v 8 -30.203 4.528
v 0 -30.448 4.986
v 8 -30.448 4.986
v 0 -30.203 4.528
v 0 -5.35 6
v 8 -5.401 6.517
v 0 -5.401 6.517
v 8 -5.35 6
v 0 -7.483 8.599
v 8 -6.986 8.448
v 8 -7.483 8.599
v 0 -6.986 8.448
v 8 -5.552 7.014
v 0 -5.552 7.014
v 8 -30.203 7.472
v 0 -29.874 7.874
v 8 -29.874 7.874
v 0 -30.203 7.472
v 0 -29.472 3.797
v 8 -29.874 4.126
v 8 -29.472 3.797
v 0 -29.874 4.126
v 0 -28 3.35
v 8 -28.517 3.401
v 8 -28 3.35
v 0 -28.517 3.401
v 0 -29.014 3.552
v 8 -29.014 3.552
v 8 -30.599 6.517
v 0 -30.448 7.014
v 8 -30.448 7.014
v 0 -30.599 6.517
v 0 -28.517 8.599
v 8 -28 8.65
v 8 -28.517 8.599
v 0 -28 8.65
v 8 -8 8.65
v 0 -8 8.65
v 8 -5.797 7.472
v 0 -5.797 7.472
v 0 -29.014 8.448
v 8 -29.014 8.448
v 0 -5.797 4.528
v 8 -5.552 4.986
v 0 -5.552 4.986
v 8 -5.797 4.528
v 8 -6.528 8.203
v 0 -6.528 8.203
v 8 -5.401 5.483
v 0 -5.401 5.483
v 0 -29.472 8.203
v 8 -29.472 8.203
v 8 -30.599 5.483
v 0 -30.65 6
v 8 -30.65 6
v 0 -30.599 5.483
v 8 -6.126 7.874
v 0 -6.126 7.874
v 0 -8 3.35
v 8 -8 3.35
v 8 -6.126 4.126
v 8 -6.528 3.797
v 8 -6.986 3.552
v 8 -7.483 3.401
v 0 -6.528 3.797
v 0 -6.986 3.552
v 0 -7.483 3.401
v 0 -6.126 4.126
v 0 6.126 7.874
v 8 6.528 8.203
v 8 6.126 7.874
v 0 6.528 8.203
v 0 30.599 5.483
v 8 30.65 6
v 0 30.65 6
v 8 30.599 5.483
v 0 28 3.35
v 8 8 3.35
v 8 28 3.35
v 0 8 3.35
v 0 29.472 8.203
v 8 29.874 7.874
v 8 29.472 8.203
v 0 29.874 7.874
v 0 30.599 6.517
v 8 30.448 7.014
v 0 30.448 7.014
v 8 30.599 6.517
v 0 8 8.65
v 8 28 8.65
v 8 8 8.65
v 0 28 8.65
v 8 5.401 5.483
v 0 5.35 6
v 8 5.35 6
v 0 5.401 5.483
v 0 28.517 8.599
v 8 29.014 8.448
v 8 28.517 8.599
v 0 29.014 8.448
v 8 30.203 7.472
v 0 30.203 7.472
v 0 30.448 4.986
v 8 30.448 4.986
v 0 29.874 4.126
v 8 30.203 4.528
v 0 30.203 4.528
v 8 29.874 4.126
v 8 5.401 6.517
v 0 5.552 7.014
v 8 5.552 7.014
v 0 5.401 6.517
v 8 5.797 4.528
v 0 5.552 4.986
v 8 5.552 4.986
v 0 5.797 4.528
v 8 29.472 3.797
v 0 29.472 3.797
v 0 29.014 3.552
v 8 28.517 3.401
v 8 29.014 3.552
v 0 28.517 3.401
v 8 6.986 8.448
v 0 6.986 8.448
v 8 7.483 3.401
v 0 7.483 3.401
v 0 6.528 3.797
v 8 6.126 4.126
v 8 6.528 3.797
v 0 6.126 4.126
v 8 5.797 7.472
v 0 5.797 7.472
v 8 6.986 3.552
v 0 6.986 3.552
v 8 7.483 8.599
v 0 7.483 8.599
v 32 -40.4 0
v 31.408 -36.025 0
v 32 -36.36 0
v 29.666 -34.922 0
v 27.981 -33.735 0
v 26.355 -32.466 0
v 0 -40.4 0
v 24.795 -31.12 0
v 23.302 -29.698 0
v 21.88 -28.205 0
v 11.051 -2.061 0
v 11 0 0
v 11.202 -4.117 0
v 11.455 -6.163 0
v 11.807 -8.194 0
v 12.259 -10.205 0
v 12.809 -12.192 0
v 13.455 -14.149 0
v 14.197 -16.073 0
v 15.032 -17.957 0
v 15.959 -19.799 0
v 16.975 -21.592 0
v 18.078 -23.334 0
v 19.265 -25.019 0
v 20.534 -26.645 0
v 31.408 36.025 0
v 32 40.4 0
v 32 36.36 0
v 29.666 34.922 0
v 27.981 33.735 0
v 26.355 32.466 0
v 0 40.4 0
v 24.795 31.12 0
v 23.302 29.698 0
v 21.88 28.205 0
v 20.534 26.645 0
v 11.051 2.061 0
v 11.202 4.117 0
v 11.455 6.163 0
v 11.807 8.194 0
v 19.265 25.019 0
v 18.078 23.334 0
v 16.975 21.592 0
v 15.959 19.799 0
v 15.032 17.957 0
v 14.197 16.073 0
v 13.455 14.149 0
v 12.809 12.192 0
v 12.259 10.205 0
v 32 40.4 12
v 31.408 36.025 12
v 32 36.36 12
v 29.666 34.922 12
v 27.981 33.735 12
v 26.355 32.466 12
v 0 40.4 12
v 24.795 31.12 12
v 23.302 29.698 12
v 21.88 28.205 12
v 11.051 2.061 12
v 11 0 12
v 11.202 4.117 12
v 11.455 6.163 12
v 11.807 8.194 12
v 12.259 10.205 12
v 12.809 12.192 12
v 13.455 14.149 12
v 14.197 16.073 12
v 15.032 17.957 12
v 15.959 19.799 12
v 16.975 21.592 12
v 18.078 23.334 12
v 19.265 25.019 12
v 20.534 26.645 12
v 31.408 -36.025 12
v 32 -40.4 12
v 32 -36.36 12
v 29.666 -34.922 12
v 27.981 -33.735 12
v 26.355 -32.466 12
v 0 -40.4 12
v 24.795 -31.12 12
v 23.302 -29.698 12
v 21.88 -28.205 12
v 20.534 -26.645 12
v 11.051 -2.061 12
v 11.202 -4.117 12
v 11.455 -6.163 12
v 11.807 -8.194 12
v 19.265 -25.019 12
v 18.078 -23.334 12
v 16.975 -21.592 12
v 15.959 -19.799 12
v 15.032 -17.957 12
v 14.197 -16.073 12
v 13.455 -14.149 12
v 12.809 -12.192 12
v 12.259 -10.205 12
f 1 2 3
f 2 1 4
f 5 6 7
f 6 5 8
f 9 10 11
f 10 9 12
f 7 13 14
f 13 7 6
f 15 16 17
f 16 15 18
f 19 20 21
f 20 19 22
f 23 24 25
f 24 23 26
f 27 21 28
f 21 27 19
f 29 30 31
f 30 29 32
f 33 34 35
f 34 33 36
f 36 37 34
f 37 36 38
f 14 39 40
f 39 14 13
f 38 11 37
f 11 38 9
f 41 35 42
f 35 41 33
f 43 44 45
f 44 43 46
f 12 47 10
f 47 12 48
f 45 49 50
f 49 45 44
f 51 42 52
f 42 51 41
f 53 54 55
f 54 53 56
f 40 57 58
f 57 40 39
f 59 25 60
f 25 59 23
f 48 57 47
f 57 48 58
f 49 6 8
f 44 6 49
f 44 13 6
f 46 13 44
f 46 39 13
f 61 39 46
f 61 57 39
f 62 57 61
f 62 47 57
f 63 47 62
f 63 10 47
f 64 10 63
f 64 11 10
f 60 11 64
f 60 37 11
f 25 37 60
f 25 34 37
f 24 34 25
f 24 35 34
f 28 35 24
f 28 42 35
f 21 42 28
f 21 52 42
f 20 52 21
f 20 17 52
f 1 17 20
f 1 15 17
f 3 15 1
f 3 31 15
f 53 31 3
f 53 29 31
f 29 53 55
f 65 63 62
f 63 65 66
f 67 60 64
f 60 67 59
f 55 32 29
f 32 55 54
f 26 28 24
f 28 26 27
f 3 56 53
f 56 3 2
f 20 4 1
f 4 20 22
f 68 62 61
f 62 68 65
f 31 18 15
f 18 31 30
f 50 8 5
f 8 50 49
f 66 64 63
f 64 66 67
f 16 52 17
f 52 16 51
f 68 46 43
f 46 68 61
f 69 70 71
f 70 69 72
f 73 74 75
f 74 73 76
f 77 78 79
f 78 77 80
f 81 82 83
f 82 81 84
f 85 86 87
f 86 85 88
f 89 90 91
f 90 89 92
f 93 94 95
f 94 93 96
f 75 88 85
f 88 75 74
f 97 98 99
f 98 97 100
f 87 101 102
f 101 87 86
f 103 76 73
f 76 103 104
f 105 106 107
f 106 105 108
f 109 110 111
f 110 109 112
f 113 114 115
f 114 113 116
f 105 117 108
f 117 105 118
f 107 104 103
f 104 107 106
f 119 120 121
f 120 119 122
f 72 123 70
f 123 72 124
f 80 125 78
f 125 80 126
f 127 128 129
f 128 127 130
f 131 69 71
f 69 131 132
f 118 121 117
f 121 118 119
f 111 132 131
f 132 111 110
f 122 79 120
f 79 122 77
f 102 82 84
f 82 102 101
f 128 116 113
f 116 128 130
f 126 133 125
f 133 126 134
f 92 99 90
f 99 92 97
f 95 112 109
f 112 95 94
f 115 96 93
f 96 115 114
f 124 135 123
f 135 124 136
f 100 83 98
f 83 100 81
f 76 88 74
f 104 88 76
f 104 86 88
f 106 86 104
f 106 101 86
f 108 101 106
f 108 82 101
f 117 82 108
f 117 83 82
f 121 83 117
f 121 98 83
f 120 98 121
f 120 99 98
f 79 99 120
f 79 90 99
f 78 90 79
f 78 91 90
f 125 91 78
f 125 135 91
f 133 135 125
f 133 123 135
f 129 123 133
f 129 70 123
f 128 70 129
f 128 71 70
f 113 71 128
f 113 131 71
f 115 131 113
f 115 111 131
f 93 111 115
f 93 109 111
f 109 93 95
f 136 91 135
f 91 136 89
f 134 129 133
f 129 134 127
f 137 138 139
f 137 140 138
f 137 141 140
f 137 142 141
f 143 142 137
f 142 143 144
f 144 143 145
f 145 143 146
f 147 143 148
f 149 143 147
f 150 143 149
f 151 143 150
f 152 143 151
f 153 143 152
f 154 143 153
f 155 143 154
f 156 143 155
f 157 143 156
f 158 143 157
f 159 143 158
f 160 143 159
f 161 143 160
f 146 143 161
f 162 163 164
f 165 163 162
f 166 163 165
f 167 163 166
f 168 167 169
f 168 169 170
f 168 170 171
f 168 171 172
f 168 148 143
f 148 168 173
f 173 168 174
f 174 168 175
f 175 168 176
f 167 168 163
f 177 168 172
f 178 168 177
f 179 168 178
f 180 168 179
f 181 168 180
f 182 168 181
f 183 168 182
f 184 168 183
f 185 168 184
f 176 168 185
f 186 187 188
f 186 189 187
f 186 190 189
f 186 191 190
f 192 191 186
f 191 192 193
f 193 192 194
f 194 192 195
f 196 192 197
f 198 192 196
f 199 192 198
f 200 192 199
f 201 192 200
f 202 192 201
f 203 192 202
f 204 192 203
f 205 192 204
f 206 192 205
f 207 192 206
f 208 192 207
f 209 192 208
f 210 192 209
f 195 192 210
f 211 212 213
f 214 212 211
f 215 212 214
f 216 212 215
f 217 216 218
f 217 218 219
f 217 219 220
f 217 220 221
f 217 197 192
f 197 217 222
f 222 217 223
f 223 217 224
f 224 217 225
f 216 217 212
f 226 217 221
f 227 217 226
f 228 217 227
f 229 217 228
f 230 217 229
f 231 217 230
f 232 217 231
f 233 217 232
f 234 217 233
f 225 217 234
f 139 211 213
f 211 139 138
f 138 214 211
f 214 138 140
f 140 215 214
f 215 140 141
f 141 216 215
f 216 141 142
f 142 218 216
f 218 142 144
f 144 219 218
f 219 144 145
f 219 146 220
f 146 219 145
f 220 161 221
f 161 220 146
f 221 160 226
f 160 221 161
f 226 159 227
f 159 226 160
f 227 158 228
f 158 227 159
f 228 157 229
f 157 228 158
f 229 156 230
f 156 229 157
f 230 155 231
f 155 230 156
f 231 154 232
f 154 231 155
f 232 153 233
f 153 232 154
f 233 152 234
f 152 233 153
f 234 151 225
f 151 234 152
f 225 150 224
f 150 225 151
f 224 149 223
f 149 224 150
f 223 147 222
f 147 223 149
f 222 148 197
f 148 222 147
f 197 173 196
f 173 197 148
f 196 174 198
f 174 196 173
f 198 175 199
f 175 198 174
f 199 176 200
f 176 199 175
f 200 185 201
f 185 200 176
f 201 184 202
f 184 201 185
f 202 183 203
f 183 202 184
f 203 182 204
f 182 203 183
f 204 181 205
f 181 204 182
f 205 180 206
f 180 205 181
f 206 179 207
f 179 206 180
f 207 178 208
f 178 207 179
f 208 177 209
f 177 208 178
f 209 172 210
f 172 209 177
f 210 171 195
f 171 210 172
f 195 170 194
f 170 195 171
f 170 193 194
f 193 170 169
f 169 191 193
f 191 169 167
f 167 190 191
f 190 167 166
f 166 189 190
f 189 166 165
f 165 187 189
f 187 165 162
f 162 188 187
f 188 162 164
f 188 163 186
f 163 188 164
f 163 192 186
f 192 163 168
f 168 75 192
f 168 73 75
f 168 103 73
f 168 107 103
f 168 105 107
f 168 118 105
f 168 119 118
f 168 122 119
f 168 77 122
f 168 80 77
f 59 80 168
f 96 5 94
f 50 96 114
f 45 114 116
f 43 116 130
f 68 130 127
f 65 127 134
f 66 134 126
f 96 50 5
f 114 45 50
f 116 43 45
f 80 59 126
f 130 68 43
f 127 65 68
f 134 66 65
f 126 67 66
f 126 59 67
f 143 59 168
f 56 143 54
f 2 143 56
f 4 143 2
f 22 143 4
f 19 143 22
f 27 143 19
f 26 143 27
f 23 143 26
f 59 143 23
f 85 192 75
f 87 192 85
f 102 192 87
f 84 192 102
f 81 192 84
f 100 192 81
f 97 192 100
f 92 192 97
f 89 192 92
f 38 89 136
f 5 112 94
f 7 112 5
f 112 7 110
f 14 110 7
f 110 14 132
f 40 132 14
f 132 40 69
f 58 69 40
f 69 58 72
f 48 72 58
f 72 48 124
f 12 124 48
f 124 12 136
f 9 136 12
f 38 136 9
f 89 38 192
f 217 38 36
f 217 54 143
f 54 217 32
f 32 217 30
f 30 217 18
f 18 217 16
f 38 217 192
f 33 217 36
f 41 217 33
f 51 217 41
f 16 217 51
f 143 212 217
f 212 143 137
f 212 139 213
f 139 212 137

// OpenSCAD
// ==========================================================================
//  GENERATED FILE -- DO NOT EDIT.
//  Produced by build/build.py from components/Turtle_Pressor.scad
//  Turtle Body version 6.7.3
//  Edit lib/ and src/ instead, then run: python3 build/build.py
// ==========================================================================
/*
 Hope Turtle pressor -- Ecojoiner bottle clamp block. Units: mm. License: CERN-OHL-S-2.0.
 EXPERIMENTAL -- not built, fitted or tested. Not yet used by the Ecojoiner
 or full-turtle assemblies (they still show acorn nuts).
 A 12 mm board block in the port gap between a Little John and the bottle,
 its inner edge cut concave to the bottle radius. The John's two M5 cap
 screws drive into two 5.3 mm pill slots (+-10 mm along the edge, v6.6.4) in its back edge and push it onto the
 bottle as they are turned in (screws not modelled). Two are used per port; this file always
 outputs ONE (default part="pressor", already in the print pose). Print part="pressor"
 flat on its board face; the edge holes are horizontal bores. Two per port, one each side of the bottle (24 for six ports).

 SOURCE FILE — geometry lives in lib/pressor.scad + lib/params.scad.
 The committed self-contained file is generated by build/build.py.
*/

/* [Display] */
part = "pressor"; // [pressor,assembly,profile]  -- every part is ONE piece
show_references = true;     // translucent bottle + Little John stand-ins (F5 only)
enable_color_coding = true; // false = neutral shades of brown

/* [Render] */
fn = 128;

// [bundle] begin use <../../lib/pressor.scad>
// ==========================================================================
//  Turtle Body -- pressor: bottle clamp block for an Ecojoiner port
//  (lib module, EXPERIMENTAL, v6.6.1)
// --------------------------------------------------------------------------
//  A flat block cut from the 12 mm board stock that sits in the port gap
//  between a Little John's port face and the bottle. Its inner edge is cut
//  concave to the bottle radius so it wraps the bottle flush. The John's two
//  M5 cap screws pass through the John into Ø5.3 holes (p_pressor_hole_d()) in the
//  pressor's straight back edge. Because the screw bites both pieces, turning
//  it in carries the pressor toward the bottle: the screws push it, with no
//  acorn nut. Two pressors per port, one each side, hug the bottle between
//  them. Not built, fitted or tested.
//
//  Local frame (one pressor, as installed on the -X side of the bottle):
//    X = across the port, from the John toward the bottle. X = 0 is the
//        pressor's straight back edge (faces the John).
//    Y = across the port, along the John height, centred on the bottle axis.
//        The block spans the full port height between the Long Johns.
//    Z = along the bottle axis = the board thickness, Z = 0..t.
//  The concave arc is centred at X = back-to-bottle-axis, Y = 0, radius =
//  bottle radius. The block's inner (straight) edge stands
//  p_pressor_wrap() past the bottle's tangent line, so the arc runs out at
//  Y = +-sqrt(r^2 - (r - wrap)^2) and the corners beyond stay square.
//
//  Pressed (installed) state: the arc meets the bottle; the back edge sits
//  p_pressor_travel() off the John face. Relaxed, the back is on the John and
//  the arc stands that far off the bottle.
//
//  Definitions only. Geometry is emitted by pressor(), pressor_2d() or
//  pressor_port_assembly().
// ==========================================================================

// [bundle] begin use <params.scad>
// ==========================================================================
//  Turtle Body -- shared dimension contract
// --------------------------------------------------------------------------
//  The single source of truth for every dimension that more than one
//  subsystem depends on. Values are exposed as zero-argument functions so
//  this file can be pulled in with `use <params.scad>` (which ignores
//  top-level variable assignments) without polluting any namespace.
//
//  lib/ modules take these as DEFAULT argument values:
//      module control_cap(roof_t = p_cap_roof_t(), ...) { ... }
//  so a src/ wrapper can still override one value from its customizer block
//  while every other subsystem keeps the shared number.
//
//  Rules:
//   * one function per concept, canonical name (see CLAUDE.md cross-file table)
//   * derived values are functions of other p_*() functions, never re-typed
//   * mm throughout; names say _d (diameter), _r (radius), _t (thickness),
//     _len / _h (axial), _af (hex across-flats)
//   * do NOT add a bare `x = ...;` here -- bundle.py / lint.py will reject it
// ==========================================================================

// ---- tolerances and render quality --------------------------------------
function p_eps()          = 0.02;   // Boolean overlap / cut-through fudge
function p_fit_clearance() = 0.2;   // wood joint: TOTAL extra slot width, centred on the board
function p_fn_plastic()   = 120;    // printed PLA parts (cap, cage, axle, mold)
function p_fn_wood()      = 96;     // cut wooden parts
function p_fn_curve()     = 180;    // fine profile curves (bottle, sails)

// ---- bottle (the foundation reference) ---------------------------------
function p_bottle_d()        = 84;    // outside diameter (was 86, and 82 before that; other bottle dims held)
function p_bottle_h()        = 305;   // total height incl. ordinary screw cap
function p_bottle_wall_t()   = 0.5;   // modelling assumption, not a measurement
function p_bottle_cap_d()    = 31;    // ordinary screw cap (NOT the control-cap disk)
function p_bottle_cap_h()    = 17;    // ordinary screw cap height (rear-fin / ballast formulas)
function p_collar_d()        = 34;    // bottle collar, independent of cap diameter
function p_top_dome_h()      = 62;
function p_bottom_dome_h()   = 25;
function p_dome_power()      = 2.5;   // superellipse exponent
function p_bottle_neck_h()   = 5;
function p_bottle_collar_h() = 1;
function p_bottle_neck_d()   = p_bottle_cap_d() - 3;   // 28: neck is 3 mm under the cap
function p_bottle_base_ratio() = 0.88; // slightly narrower footprint at the base
function p_bottle_profile_steps() = 16;
// cut bottle (control head): the lower dome is removed and a short socket is
// bored so the control-cap insert slides in. Cut plane sits 5 mm above the
// bottom dome height.
function p_bottle_cut_extra()  = 5;
function p_bottle_cut_height() = p_bottom_dome_h() + p_bottle_cut_extra();   // 30

// nominal bottle interior and the cap insert that enters it
function p_bottle_socket_d() = p_bottle_d() - 2 * p_bottle_wall_t();          // 81
function p_insert_shaft_radial_clearance() = 1;
function p_insert_shaft_d()  = p_bottle_socket_d()
                             - 2 * p_insert_shaft_radial_clearance();          // 79

// ---- wooden stock -----------------------------------------------------
function p_wood_t()          = 12;    // shared board / slat thickness
function p_fin_board_w()     = 93;    // shared fin-system stock width
function p_screw_side_offset() = 17;  // mounting-hole inset from a John end (was 25 until v4.2.0)

// ---- Ecojoiner port --------------------------------------------------
// A port must swallow the bottle's tapered top (the top dome) plus a seating
// allowance, so its axial length is DERIVED from the bottle, not fixed. This
// is the same rule the HopeTurtles.org generators use
// (port_length = taper_height + port_allowance); until 2026-09-08 lib carried
// the evaluated constant 82 instead, which silently broke the rule for any
// bottle other than the reference one. Ballast and Ecojoiner both read it.
function p_port_allowance()  = 20;                 // seating allowance beyond the dome
function p_port_length()     = p_top_dome_h() + p_port_allowance();   // 62 + 20 = 82
function p_port_height()     = p_bottle_d();       // opening height == bottle diameter (asserted)

// ---- M6 hardware ---------------------------------------------------
function p_m6_clearance_d()  = 6.4;   // M6 clearance hole
function p_m6_bolt_shaft_d() = 6;     // visual placeholder only
function p_m6_bolt_head_d()  = 12;
function p_m6_bolt_head_t()  = 4;

// ---- Ecojoiner bottle clamp: M5 cap screws + acorn nuts (v5.0.0/v5.1.0) --
// Replaces the M6 bolt + 12 mm presser disk. Each John port end carries TWO
// black M5 x 30 socket-head cap screws, stacked across the John height (one
// above, one below the centreline). v5.1.0: no nut -- each screw BITES into
// a 5.2 mm hole in the wood (builder's research; not verified here), so the
// screw itself holds its position and is adjusted with a hex key from
// outside. A black acorn (cap) nut, run fully onto the tip, bears on the
// bottle. Hardware sizes are ISO 4762 / DIN 1587 nominals for visual and
// stack checks only -- measure the hardware you buy.
// Bite-fit hole (was 5.5 clearance in v5.0.0). NOTE it is slightly LARGER
// than the 5 mm nominal major diameter: the hold relies on wood fibre
// springback around the thread, per the builder's own tests -- unverified
// here, and likely to vary with species, moisture and drill quality.
function p_m5_hole_d()           = 5.2;
function p_m5_bolt_d()           = 5;     // visual shank (plain cylinder)
function p_m5_bolt_len()         = 30;    // shank length under the head
function p_m5_head_d()           = 8.5;   // ISO 4762 socket head
function p_m5_head_h()           = 5;
function p_m5_acorn_af()         = 8;
function p_m5_acorn_h()          = 10;    // overall, hex base to dome tip
function p_m5_acorn_thread_depth() = 7;   // usable thread before the bolt bottoms
// Pair layout, shared by the John holes and every board bolted through them
// (rear-fin shafts, ballast core slats): each bolt sits this far in from a
// John long edge, i.e. +-p_eco_screw_pair_offset() from the John centreline.
function p_eco_screw_edge_inset()  = 12;   // was 10 until v5.2.0
function p_eco_screw_pair_offset() =
    (p_port_height() - 2 * p_wood_t()) / 2 - p_eco_screw_edge_inset();   // 18

// ---- pressor (EXPERIMENTAL, v6.6.1; lib/pressor.scad, CLAUDE.md s13a) ----
//  A 12 mm board block in the port gap between a Little John and the bottle,
//  concave-cut to the bottle radius. It rides on the John's M5 pair (both
//  ends bite) and is pushed onto the bottle as the screws are turned in --
//  replaces the acorn nut. Two per port, one each side of the bottle.
function p_pressor_wrap()       = p_bottle_d() / 4;  // 21: inner edge reaches this far past the
                                                      // bottle's tangent line, toward its axis
function p_pressor_travel()     = 1;     // screw-in travel: gap left at the John face when pressed
function p_pressor_hole_d()     = 5.3;   // M5 hole in the pressor's back edge (v6.6.2; the Johns keep p_m5_hole_d() 5.2)
function p_pressor_hole_depth() = 8;     // M5 slot depth into the pressor's back edge (v6.6.4: was 10;
                                          // the slot's inner end sits where the bottle curve is closest)
function p_pressor_min_wall()   = 3;     // least wood around / beyond a screw hole (asserted)
function p_pressor_end_trim()   = 1.5;   // v6.6.4: taken off EACH end (top/bottom edge) -- the printed
                                          // prototype was 3 mm too long to enter the port
function p_pressor_slot_ext()   = 10;    // v6.6.4: each M5 hole stretched this far EACH way along the
                                          // edge into a pill slot, so the John's screws find it easily

// ---- control cap (large stationary disk; see CLAUDE.md s7) ----------
//  TB-03 resolution: repository 5 mm roof / 2 mm boss is authoritative;
//  the axle (below) is derived to this datum.
function p_cap_disk_d()      = 102;   // control-cap disk (independent of p_bottle_cap_d; was 100, +2 mm)
function p_cap_roof_t()      = 5;     // disk / roof thickness
function p_cap_boss_depth()  = 0;     // extra projection of the centre boss into the hollow cap.
                                       // 0 = no boss, flat cavity ceiling (v6.5.1; was 1.5, before that 2)
function p_cap_boss_d()      = 18;
function p_cap_insert_len()  = 35;    // straight insert shaft length
function p_cap_insert_wall_t() = 4;
function p_cap_entry_chamfer_h()     = 1;
function p_cap_entry_chamfer_delta() = 1;
function p_cap_axle_bore_d() = 6;     // loose: 0.5 mm radial clearance to the Ø5 steel shaft (was 8.7 for Ø8 PLA)
function p_cap_cage_radial_clearance() = 1;   // cap disk -> cage inner wall (radial)
function p_cap_total_h()     = p_cap_roof_t() + p_cap_insert_len();           // 40
function p_cap_bearing_len() = p_cap_roof_t() + p_cap_boss_depth();           // 5 (was 6.5, 7)

// buttons (through both cap and cage)
function p_button_upper_d()  = 17;    // clearance hole in the cap
function p_button_axis()     = "y";   // "x" or "y"
function p_button_radius()   = 25;    // radial position of the two button centres (50 mm apart;
                                       // was 24 / 48 mm -- shared with the cage's matching bore)

// ---- silicone seal grooves + rings (CLAUDE.md s8) ------------------
function p_seal_groove_count()      = 2;
function p_seal_groove_axial_h()    = 2.7; // groove height (was 3.5; retuned to just clear
                                            // the 2.6 mm ring axial thickness below, 0.1 mm margin)
function p_seal_groove_radial_depth() = 2; // groove depth
function p_seal_groove1_from_shoulder() = 12;  // groove centre, measured from the insert SHOULDER
function p_seal_groove2_from_shoulder() = 25;
function p_seal_ring_axial_t()      = 2.6;  // cast ring thickness (was 3)
function p_seal_ring_radial_w()     = 10;   // cast ring radial width (was 5; doubled). NOT validated.
function p_seal_ring_elasticity_reduction() = 0.25;
    // Cast the ring's inner diameter this fraction SMALLER than the groove
    // root it mates to, so real (stretchy) silicone is under tension --
    // and therefore actually grips -- once stretched onto the cap, instead
    // of sitting at a 1:1 as-cast fit. Tweak this here as real silicone
    // behaviour is characterized; NOT validated (see lib/silicone_ring_mold.scad).
function p_seal_groove_root_d() = p_insert_shaft_d()
                                - 2 * p_seal_groove_radial_depth();            // 79 at the 86 mm bottle

// ---- sail shaft: uniform round centre axle (CLAUDE.md s9) ----------
//  Derived to the 5/2 cap datum (TB-03/TB-04). round_inside_cap is measured
//  from the roof underside and INCLUDES the boss -- do not add the boss again.
//  TB-08: the shaft is now one uniform round bar top to bottom -- no hex
//  section. It free-spins in the cap bore (p_cap_axle_bore_d) and passes
//  with a light running clearance through the cage hub bore and the top
//  sail bar's own hole (both p_axle_shaft_hole_d()); it locks to the
//  ROTATING cage with a single M3 set screw through the cage hub
//  (p_cage_setscrew_pilot_d()) rather than a shaped (hex) interference fit.
function p_axle_round_d()        = 5;    // Ø5 steel rod (v6.4.0; was an Ø8 printed PLA shaft)
function p_axle_round_ext()      = 1;    // projection above the cap's outer face
function p_axle_round_inside_cap() = p_cap_insert_len() - 5;  // 30: roof underside to round end (incl. boss)
function p_axle_round_len()      = p_axle_round_inside_cap() + p_cap_roof_t() + p_axle_round_ext();  // 36
function p_axle_upper_len()      = 23;   // continues up through the cage hub + sail bar (was the hex length)
function p_axle_total_len()      = p_axle_upper_len() + p_axle_round_len();
function p_axle_shaft_clearance() = 0.4; // snug fit, diametral (was 0.2 on the Ø8 shaft): any hole the shaft passes
                                          // (but does not bear in) is p_axle_round_d() + this
function p_axle_shaft_hole_d()   = p_axle_round_d() + p_axle_shaft_clearance();  // 5.4 (cage hub bore)
function p_magnet_d()            = 3;    // AS5600 sensing magnet recess
function p_magnet_t()            = 1;

// ---- axle rotary shaft O-ring (waterproofs the axle bore; cast in the mold) ----
//  A round-section O-ring seated in a gland in the control-cap bore, sealing
//  against the spinning round section of the axle. ID is tied to the shaft.
function p_axle_oring_cs()     = 2.0;                                   // cross-section
function p_axle_oring_id()     = p_axle_round_d();                      // 5 -- hugs the shaft
function p_axle_oring_od()     = p_axle_oring_id() + 2 * p_axle_oring_cs();          // 9
function p_axle_oring_mean_r() = (p_axle_oring_id() + p_axle_oring_cs()) / 2;        // 3.5
//  gland cut into the cap bore for it
function p_cap_oring_squeeze()      = 0.25;  // radial squeeze on the seal
function p_cap_oring_gland_od()     = p_axle_oring_od() - 2 * p_cap_oring_squeeze(); // 8.5
function p_cap_oring_gland_w()      = 1.3 * p_axle_oring_cs();                       // 2.6 axial
function p_cap_oring_gland_from_face() = p_cap_bearing_len() / 2; // gland centre, from the cap outer face, along the bore
                                         // (2.5 = mid-roof since the boss went in v6.5.1; was 3.5)

// ---- rotating control cage (CLAUDE.md s6) ------------------------
function p_cage_wall_t()     = 6.5;   // radial wall thickness
function p_cage_roof_t()     = 4;     // roof / surface plate thickness
function p_cage_inner_d()    = p_cap_disk_d() + 2 * p_cap_cage_radial_clearance();   // 102
function p_cage_outer_d()    = p_cage_inner_d() + 2 * p_cage_wall_t();               // 115
function p_cage_skirt_depth()   = 44;   // roof underside to the ORIGINAL skirt rim
function p_cage_peak_extension() = 20;  // crest extends this far past the original rim
function p_cage_valley_wall_h()  = 10;  // minimum wall depth between mounts
function p_cage_total_h()    = p_cage_skirt_depth() + p_cage_roof_t();              // 48 (native)
function p_cage_notch_count()   = 4;
function p_cage_notch_w()    = 22.5;  // batten groove width
function p_cage_notch_depth() = 3.7;
function p_cage_wave_segments() = 240;
function p_cage_hub_d()      = 29;
function p_cage_pocket_d()   = 26;    // top clip pocket (control_cage top_pocket, OFF by default)
function p_cage_pocket_depth() = 4;   //   "        "     "
// TB-08: hex bore replaced by a plain round bore (p_axle_shaft_hole_d(),
// shared with the sail bar) + a radial M3 set screw that locks the cage to
// the shaft -- see p_cage_setscrew_*() below.
function p_cage_bearing_d()  = 9;     // hemispherical bearing bump
function p_cage_bearing_count() = 8;
function p_cage_bearing_pcd() = p_cap_disk_d() - p_cage_bearing_d() + 0.5;          // 91.5
function p_cage_top_hole_d() = 18;    // button / access hole through the roof (v6.5.2: back to 18 from 22;
                                       // the 22 opened onto the hub for set-screw access, off since v6.0.0)
function p_cage_mount_hole_d() = 3.2; // two M3 clearance holes per batten / groove
function p_cage_mount_pitch()  = 32;  // vertical pitch of the pair
function p_cage_lower_hole_from_tip() = 10;
// Single radial M3 set (grub) screw through the hub wall, pressing on the
// shaft to lock cage <-> shaft rotation (TB-08). Self-tapping into the
// printed PLA hub -- not a clearance hole for a separate nut, unlike the
// batten/mount M3 holes above. Pilot diameter is an untested starting
// point (typical M3-into-rigid-plastic self-tap pilots run 2.5-2.8 mm) --
// verify real thread engagement and tapping torque before relying on it.
function p_cage_setscrew_pilot_d() = 2.5;
// v6.0.0: the hub set screw (and its access recess) is switched OFF -- the
// M3 in the sail crossbar connector now clamps the shaft. Kept, not deleted,
// so it can be turned back on.
function p_cage_setscrew_enabled() = false;
// Flat-floored access recess around the set screw, cut into the hub face the
// roof button opening uncovers, running the hub's full height (roof top down
// through the hub bottom). Width is tangential, depth is radial (inward from
// the opening's inner edge).
function p_cage_setscrew_recess_w()     = 5;
function p_cage_setscrew_recess_depth() = 3;
// Set-screw angle is no longer a separate parameter: control_cage() aims it
// at the centre of the roof button opening (button_angle) so a hex key can
// reach it through that opening.
// 45-deg outward chamfer on the roof-top outer edge (0 = sharp). The cage
// prints roof-face-down, so this bevel flares OUT from the bed and stays
// printable; it runs the full perimeter, batten grooves included. See
// lib/control_cage.scad.
function p_cage_roof_bevel() = 3;

// ---- sail apparatus (CLAUDE.md s10) ---------------------------
// SAIL battens. v6.0.0: the upper notch holds two stacked layers (connector
// below, crossbar half above), so the batten grew by the extra layer: 205 +
// 2t (229) at first, trimmed back by t to 205 + t (217) in v6.1.0 so 15 mm of
// batten stands above the notch again. Batten bottom, cage M3 holes and the
// lower rails do not move. The NON-sail battens are shorter: their top is
// flush with the cage roof top (derived in lib/sail_frame.scad, 178 mm).
function p_side_batten_h()   = 205 + p_wood_t();       // 217
function p_side_batten_w()   = 20;
// v6.5.0: battens are cut from the same board as every other slat (were a
// separate 20 x 10 stock), so their radial thickness -- and every slot that
// takes a batten -- is the board thickness.
function p_side_batten_radial_t() = p_wood_t();     // 12 (was 10)
// Top crossbar span, tip to tip: 6 x bottle_d (504). v6.1.0 briefly made each
// half a head-fin-slat length (span 843.6); v6.2.0 reverted it -- the sails
// came out too big. The halves are derived from this span.
function p_top_crossbar_len() = 6 * p_bottle_d();   // 504 (halves 212.2 each)
function p_top_crossbar_w()  = 22;
function p_top_crossbar_t()  = p_wood_t();          // 12
// v6.0.0: the top crossbar is split into a LEFT and RIGHT half plus a
// centre "sail crossbar connector". The connector lies on the cage roof and
// spans between the two sail battens; each half lies on top of it and runs
// out to its tip. Both layers half-lap into the same (now 2t tall) sail-batten
// notch, and one M3 per side screws the half down into the connector.
// The shaft passes the connector with generous clearance (no bearing), and an
// M3 self-tapped in from the connector's side face clamps it, locking frame,
// cage and shaft together (replaces the cage hub set screw).
function p_sail_connector_axle_hole_d()  = 6;     // Ø5 steel shaft, 0.5 mm radial clearance (v6.4.0; was 9 for the Ø8 shaft)
function p_sail_m3_pilot_d()             = 2.8;   // self-tap pilot: clamp screw + the half-to-connector screws
function p_sail_m3_clear_d()             = p_cage_mount_hole_d();   // 3.2, through the top (half) layer
function p_sail_connector_overhang()     = 15;    // connector past each sail batten's outer face
function p_sail_bar_half_inboard()       = 15;    // each half runs this far inboard of its batten
function p_bottom_rail_len() = 3 * p_bottle_d() + p_wood_t();   // 264 (v6.3.0: +t; 252 in v6.2.0, 360 in v6.1.0)
function p_bottom_rail_bottle_clearance() = 1;
function p_sail_rail_color()  = [0.56, 0.39, 0.39]; // brown (top AND bottom rails)
function p_c_piece_color()    = [1.0, 0.52, 0.20];  // orange, retained

// ---- rear fin + solar support (CLAUDE.md s11) ----------------
function p_solar_panel_w() = 148;
function p_solar_panel_h() = 223;
function p_solar_panel_t() = 2.5;    // real panel, independent of wood thickness
// The green shafts overlap the yellow fin over X = 0..p_rear_shaft_rear_x()
// (the half-lap zone, 84 mm). v5.3.0: the bottle base must ABUT the fin's
// front edge (X = 0) so the fin holds the bottle in its port -- previously
// the full turtle seated the bottle base at the shafts' rear end, putting the
// first 84 mm of the fin inside the bottle. The shaft front (and its John
// hole pair) stays where it was, so the shafts grow by exactly that overlap:
//   334 (old approved formula) + 84 = 418.
// v5.7.0: the yellow fin is exactly one board wide (it was board + a 15 mm
// "rear tab", 108 mm -- wider than the 93 mm board it is cut from), so the
// overlap is board width - 2t: 84 -> 69, shaft 418 -> 403, half-lap 42 -> 34.5.
function p_rear_shaft_rear_x() = p_fin_board_w() - 2 * p_wood_t();             // 69
function p_rear_shaft_len() = p_bottle_h()
                            + (2/3) * (p_fin_board_w() - 2 * p_wood_t())
                            - p_bottle_cap_h()
                            + p_rear_shaft_rear_x();                            // 403 (418 v5.3.0-v5.6.0)
function p_rear_half_lap_engagement() = p_rear_shaft_rear_x() / 2;  // 34.5 green/yellow interlock depth
// v5.4.0: the green shaft is as wide as the Ecojoiner John it bolts flush
// against (John height = port height - 2 x stock), so their edges and M5 pair
// line up. Was a fixed 59 -- 1 mm narrower than the 60 mm John, and the M5
// pair (centred on it) sat 11.5 mm in from its edges instead of 12.
function p_rear_shaft_width()   = p_port_height() - 2 * p_wood_t();            // 60
// TB-07: the green-slat mounting hole follows the mating Ecojoiner John, not a
// fixed 50 mm. Derived from the install transform; the john_length/2 terms
// cancel, leaving a pure function of the shared contract (= 113 at defaults).
// v5.3.0: the install now seats the bottle base at fin X = 0 (not at the
// shaft rear, X = p_rear_shaft_rear_x()), so that overlap is subtracted back
// out -- the hole stays 113 mm from the (unmoved) shaft front.
function p_rear_shaft_hole_from_front() =
    p_rear_shaft_len() - p_rear_shaft_rear_x() - p_screw_side_offset()
    - p_bottle_h() + p_bottle_cap_h() + p_port_height();

// ---- head fin: front fin (v5.8.0, EXPERIMENTAL; triangle since v6.3.0) ---------
// The rear fin's mirror on the front (-X / physical 9 o'clock) port: two
// flat slats above and below the front bottle bolt to the same Little John
// M5 pairs and run the length of the bottle; a vertical triangular fin
// half-laps into their outer ends and abuts the bottle base. Not built or
// tested. See lib/head_fin.scad.
//  * fin width (forward, along the bottle axis) = the widest board, so the
//    fin is cut across one board (its height runs along the board's length)
//  * the slats reach exactly as far into the Ecojoiner as the rear shafts,
//    so their M5 pair lands at the same distance from the slat front
function p_head_fin_w()       = p_fin_board_w();                         // 93
function p_head_fin_h()       = p_bottle_d() + 6 * p_wood_t();           // 156: 2t of fin beyond each slat
function p_head_slat_overlap() = 4 * p_wood_t();                         // 48: slat run into the fin
// v6.3.1 profile (v6.3.0 had the slope the other way): the TOP edge runs
// out only to this X (where the slats end); the leading edge slopes down and
// FORWARD from there to a vertical flat "toe" at the full fin width, which
// meets the bottom edge. Full width along the BOTTOM edge.
function p_head_fin_heel_x()  = p_head_slat_overlap();                   // 48: top-edge length
function p_head_fin_toe_h()   = 3 * p_wood_t();                          // 36: vertical flat nose at the bottom front (v6.3.4; was 2t)
// v6.3.2: the fin extends DOWN below p_head_fin_h()'s bottom by this much (top
// unchanged), and its new bottom-front corner is set back, giving a raked
// forefoot below the toe flat.
function p_head_fin_drop()    = 3 * p_wood_t();                          // 36
function p_head_fin_forefoot_setback() = p_head_fin_drop();             // 36: = drop -> 45 deg cut (v6.3.3; was 18)
function p_head_half_lap_engagement() = p_head_slat_overlap() / 2;       // 24
function p_head_slat_reach()  = p_rear_shaft_len() - p_rear_shaft_rear_x();   // 334: bottle base -> slat front
function p_head_slat_len()    = p_head_slat_reach() + p_head_slat_overlap();  // 382
function p_head_slat_width()  = p_rear_shaft_width();                    // 60 == John height
function p_head_slat_hole_from_front() = p_rear_shaft_hole_from_front(); // 113: same reach -> same John pair

// ---- ballast attachment (CLAUDE.md s12) ---------------------
function p_ballast_core_w()   = p_port_height() - 2 * p_wood_t();               // 60 == John height
function p_ballast_core_len() = p_bottle_h() - p_bottle_cap_h() + 6 * p_wood_t();  // 360
function p_ballast_slat_gap() = p_port_height();       // clear inner-face gap
function p_ballast_slat_spacing() = p_port_height() + p_wood_t();               // 96
function p_ballast_board_len() = 3.5 * p_bottle_d() + 2 * p_wood_t();   // 318 (v5.5.0: +2t, 3t ends past the foot slots)
function p_ballast_fin_len()   = 3 * p_bottle_d();     // 246
function p_ballast_lock_w()    = 5 * p_wood_t();       // 60

// ---- neutral wood shades (used when enable_color_coding = false) -------
// With the full colour code off, every wooden subsystem still renders in its
// OWN shade of brown so the parts stay visually separable. All are warm browns
// (R > G > B) spaced by lightness. The two large fins share one darker shade so
// they read as a matched pair, distinct from the rest of their own assembly.
function p_wood_shade_sail()     = [0.85, 0.66, 0.47]; // sail frame  (lightest)
function p_wood_shade_rear_fin() = [0.72, 0.50, 0.33]; // rear-fin shafts + solar holder
function p_wood_shade_eco()      = [0.62, 0.44, 0.28]; // Ecojoiner core
function p_wood_shade_ballast()  = [0.52, 0.34, 0.22]; // ballast slats / board / locks
function p_wood_shade_fin()      = [0.40, 0.26, 0.17]; // rear fin + ballast fin, shared (darkest)
// [bundle] end   <params.scad>
// [bundle] begin use <util.scad>
// ==========================================================================
//  Turtle Body -- shared helper modules and functions
// --------------------------------------------------------------------------
//  Small pieces that were copy-pasted across the standalone files. Geometry
//  lives in the per-subsystem lib/ modules; this file is only glue.
//
//  Definitions only -- no top-level geometry, no top-level assignments.
// ==========================================================================

// [bundle] begin use <params.scad>
// [bundle] already inlined: params.scad
// [bundle] end   <params.scad>

// Colour wrapper for wooden parts. When colour coding is off, every wooden
// component renders in one neutral wood tone; bottles, hardware, sails and
// printed parts keep their own colours and never call this.
module wood_color(coded_color, enabled = true, neutral = [0.94, 0.83, 0.62]) {
    color(enabled ? coded_color : neutral) children();
}

// scalar clamp
function clamp(v, lo, hi) = v < lo ? lo : (v > hi ? hi : v);

// Visual-only M6 bolt: plain shaft + hex-less cylindrical head. No thread,
// no torque rating -- a placeholder for fit inspection.
//  Local Z=0 is the underside of the head; the shaft runs toward +Z from Z=0
//  (plus an optional tip_extension), the head sits at Z=-head_t..0. Matches
//  the standalone files.
module m6_bolt_placeholder(grip_length, tip_extension = 1,
                           shaft_d = undef, head_d = undef, head_t = undef,
                           color_rgb = [0.15, 0.15, 0.15], fn = 48) {
    sd = shaft_d == undef ? p_m6_bolt_shaft_d() : shaft_d;
    hd = head_d  == undef ? p_m6_bolt_head_d()  : head_d;
    ht = head_t  == undef ? p_m6_bolt_head_t()  : head_t;
    assert(grip_length > 0, "m6_bolt_placeholder: grip_length must be positive.");
    color(color_rgb)
        union() {
            cylinder(d = sd, h = grip_length + tip_extension, $fn = fn);
            translate([0, 0, -ht])
                cylinder(d = hd, h = ht, $fn = fn);
        }
}

// Regular hexagonal prism specified by across-flats width (OpenSCAD's
// cylinder($fn=6) is specified across corners, which is the usual trap).
module hex_prism_af(across_flats, h, center = false) {
    cylinder(d = across_flats / cos(30), h = h, $fn = 6, center = center);
}
// [bundle] end   <util.scad>
// [bundle] begin use <ecojoiner.scad>
// ==========================================================================
//  Turtle Body -- Ecojoiner core frame  (lib module)
// --------------------------------------------------------------------------
//  Three interlocked rectangles of Long + Little Johns, four Final Keys and
//  the M5 bottle clamps: two black socket-head cap screws at each Little/
//  Master John port end (24 in all), stacked across the John height, each
//  biting into its 5.2 mm hole and poking through to the port side where a
//  black acorn nut bears on the bottle (v5.0.0 replaced the M6 bolt + 12 mm
//  presser disk; v5.1.0 dropped the jam nut and wing head). One of the six Little Johns is
//  a "Master John": identical outline, but its two top slots are cut deeper so
//  it can be dropped in last, past the already-seated Johns of the almost-
//  closed frame. Bottle dimensions are sizing inputs only -- this module never
//  emits a bottle. See CLAUDE.md s13.
//
//  Standalone output clamps all six ports. Where the rear-fin shafts and
//  ballast core slats fill the port gap, the full Turtle passes the suppress
//  flags through eco_centered_rectangle(): those screw pairs then bite through
//  John + slat, backed out so the bare tip just meets the bottle; no acorn.
//  The suppress_* argument names are kept from the presser era.
//
//  Definitions only. Geometry is emitted by eco_ecojoiner_only() or, for the
//  full assembly, by eco_centered_rectangle() + eco_inserted_final_key().
// ==========================================================================

// [bundle] begin use <params.scad>
// [bundle] already inlined: params.scad
// [bundle] end   <params.scad>
// [bundle] begin use <util.scad>
// [bundle] already inlined: util.scad
// [bundle] end   <util.scad>

// ---- derived dimensions (shared contract in, one definition each) -------
function eco_slat_t()        = p_wood_t();
function eco_port_length()   = p_port_length();
function eco_port_height()   = p_port_height();
function eco_john_height()   = eco_port_height() - 2 * eco_slat_t();          // 58
function eco_john_length()   = 2 * eco_port_length() + eco_port_height()
                             + 4 * eco_slat_t();                             // 294
function eco_slot_width()    = eco_slat_t() + p_fit_clearance();             // 12.2
function eco_slot_depth()    = ceil(eco_john_height() / 2);                  // 29
// The Master John is inserted last, into an almost-closed frame, so its two
// top slots run deeper than a standard John's -- normally half the port
// height, capped at 60% of the slat's own height so enough material stays
// below the groove. Rule lifted from the HopeTurtles.org 6FC generator
// (objects/ecojoiner_6fc.py :: master_slot_depth) -- see CLAUDE.md s19.
function eco_master_slot_depth() = min(floor(eco_port_height() / 2),
                                      floor(eco_john_height() * 0.6));      // 34
function eco_long_end_span()   = eco_port_length();
function eco_little_end_span()  = eco_port_length() + eco_slat_t();
function eco_screw_y_center()  = eco_john_height() / 2;
function eco_final_key_length() = eco_port_height() + 4 * eco_slat_t();      // 130
function eco_final_key_width()  = 2 * eco_slat_t();                          // 24
function eco_little_slot_1_x() = eco_little_end_span() + eco_slat_t() / 2;
function eco_little_slot_2_x() = eco_john_length() - eco_little_end_span() - eco_slat_t() / 2;
function eco_long_slot_2_x()   = eco_john_length() - eco_long_end_span() - eco_slat_t() / 2;
function eco_rectangle_y()     = eco_long_slot_2_x()
                               - (eco_long_end_span() + eco_slat_t() / 2);
function eco_frame_center()    = [eco_john_length() / 2, eco_rectangle_y() / 2,
                                  eco_john_height() / 2];
function eco_final_key_x_offset() = eco_john_height() / 2 + eco_final_key_width() / 2;
function eco_final_key_z_offset() = eco_john_height() / 2 + eco_slat_t() / 2;

// ---- M5 clamp stack (see p_m5_*() / p_eco_screw_*() in params) ----------
// Bolt heights on the John: centreline +- the pair offset.
function eco_screw_ys() = [eco_screw_y_center() - p_eco_screw_pair_offset(),
                           eco_screw_y_center() + p_eco_screw_pair_offset()];
// Clear gap between a Little John's port-side face and the bottle at its
// closest point (the bottle is centred between the two Little Johns).
function eco_port_gap() = (eco_rectangle_y() - eco_slat_t() - p_bottle_d()) / 2;   // 12
// The pair sits off the centreline, where the round bottle has curved away:
// distance along the bolt from the John's port face to the bottle surface.
function eco_clamp_reach() = let(r = p_bottle_d() / 2, v = p_eco_screw_pair_offset())
    eco_port_gap() + r - sqrt(r * r - v * v);                                   // 16.05
// Open port, acorn run fully down the thread, dome tip touching the bottle:
// shank tip measured inward from the John's port face, and how far the cap
// screw head then stands off the John's outer face (the adjustable part --
// the screw holds by its bite in the wood).
function eco_clamp_tip()  = eco_clamp_reach() - p_m5_acorn_h() + p_m5_acorn_thread_depth();
function eco_clamp_head_standoff() = p_m5_bolt_len() - eco_slat_t() - eco_clamp_tip();
// Through port (John + rear-fin / ballast slat, no acorn): the bare tip is set
// to just meet the bottle, so the head stands off by whatever is left over.
function eco_through_room() = let(r = p_bottle_d() / 2, v = p_eco_screw_pair_offset())
    r - sqrt(r * r - v * v);                                                     // 4.05
function eco_through_tip() = min(p_m5_bolt_len() - 2 * eco_slat_t(), eco_through_room());
function eco_through_head_standoff() = p_m5_bolt_len() - 2 * eco_slat_t() - eco_through_tip();
// Footprint that must fit on a John face: the larger of the screw head and
// the acorn's across-corners hex.
function eco_clamp_footprint_d() = max(p_m5_head_d(), p_m5_acorn_af() / cos(30));

module eco_assert_valid() {
    assert(eco_john_height() > 0,
           "Ecojoiner: bottle diameter must exceed twice the wood thickness.");
    assert(eco_port_height() == p_bottle_d(),
           "Ecojoiner: port_height must equal canonical bottle_diameter.");
    assert(p_bottle_cap_d() < eco_john_height(), "Ecojoiner: cap hole too large for John height.");
    assert(p_collar_d() < eco_john_height(), "Ecojoiner: collar hole too large for John height.");
    assert(eco_master_slot_depth() >= eco_slot_depth(),
           "Ecojoiner: Master John slot must be at least as deep as a standard slot.");
    assert(eco_master_slot_depth() < eco_john_height(),
           "Ecojoiner: Master John slot would cut through the slat.");
    // M5 clamp pair
    assert(p_eco_screw_pair_offset() + eco_clamp_footprint_d() / 2 <= eco_john_height() / 2,
           "Ecojoiner: M5 screw head / acorn overhangs the John edge -- raise p_eco_screw_edge_inset().");
    assert(2 * p_eco_screw_pair_offset() >= eco_clamp_footprint_d(),
           "Ecojoiner: the two M5 screws of a pair are too close for their heads.");
    assert(p_screw_side_offset() >= eco_clamp_footprint_d() / 2,
           "Ecojoiner: M5 screw head overhangs the John end.");
    assert(p_eco_screw_pair_offset() < p_bottle_d() / 2,
           "Ecojoiner: M5 pair sits outside the bottle silhouette -- acorns cannot reach it.");
    assert(eco_clamp_reach() - p_m5_acorn_h() >= 0,
           "Ecojoiner: acorn nut would sit inside the John -- no room in the port gap.");
    assert(eco_clamp_head_standoff() >= 0,
           "Ecojoiner: M5 screw too short to reach the bottle through the John.");
    assert(eco_through_tip() >= 0,
           "Ecojoiner: M5 screw too short to pass through John + fin/ballast slat.");
}

// ---- 2D profiles ------------------------------------------------------
module eco_top_slot(center_x, depth)
    translate([center_x - eco_slot_width() / 2, eco_john_height() - depth])
        square([eco_slot_width(), depth + 1]);

module eco_center_hole(diameter)
    translate([eco_john_length() / 2, eco_john_height() / 2]) circle(d = diameter);

// Two M5 clearance holes at each end: 4 per Little / Master John.
module eco_screw_holes_2d()
    for (x = [p_screw_side_offset(), eco_john_length() - p_screw_side_offset()])
        for (y = eco_screw_ys())
            translate([x, y]) circle(d = p_m5_hole_d(), $fn = 16);

module eco_long_john_2d()
    difference() {
        square([eco_john_length(), eco_john_height()]);
        eco_top_slot(eco_long_end_span() + eco_slat_t() / 2, eco_slot_depth());
        eco_top_slot(eco_john_length() - eco_long_end_span() - eco_slat_t() / 2, eco_slot_depth());
        eco_center_hole(p_bottle_cap_d());
    }

module eco_little_john_2d()
    difference() {
        square([eco_john_length(), eco_john_height()]);
        eco_top_slot(eco_little_end_span() + eco_slat_t() / 2, eco_slot_depth());
        eco_top_slot(eco_john_length() - eco_little_end_span() - eco_slat_t() / 2, eco_slot_depth());
        eco_center_hole(p_collar_d());
        eco_screw_holes_2d();
    }

// A Little John with deeper top slots -- the last piece fitted to the frame.
module eco_master_john_2d()
    difference() {
        square([eco_john_length(), eco_john_height()]);
        eco_top_slot(eco_little_end_span() + eco_slat_t() / 2, eco_master_slot_depth());
        eco_top_slot(eco_john_length() - eco_little_end_span() - eco_slat_t() / 2, eco_master_slot_depth());
        eco_center_hole(p_collar_d());
        eco_screw_holes_2d();
    }

// ---- 3D parts -------------------------------------------------------
module eco_long_john(colored = true)
    wood_color("yellow", colored, p_wood_shade_eco())
        linear_extrude(height = eco_slat_t()) eco_long_john_2d();

module eco_little_john(colored = true)
    wood_color("seagreen", colored, p_wood_shade_eco())
        linear_extrude(height = eco_slat_t()) eco_little_john_2d();

// Same family as the Little John; darker tint marks the deeper-slotted one.
module eco_master_john(colored = true)
    wood_color([0.13, 0.42, 0.28], colored, p_wood_shade_eco())
        linear_extrude(height = eco_slat_t()) eco_master_john_2d();

module eco_final_key(colored = true)
    wood_color([0.82, 0.78, 0.05], colored, p_wood_shade_eco())
        cube([eco_final_key_length(), eco_final_key_width(), eco_slat_t()]);

// ---- M5 clamp hardware (visual only: no thread, no torque rating) -------
// Local frame: Z = 0 is the John's port-side face, +Z points into the port
// (toward the bottle), the John occupies Z = -slat_t..0.
function eco_m5_black() = [0.07, 0.07, 0.08];

module eco_m5_hex(af, h) cylinder(d = af / cos(30), h = h, $fn = 6);

// Black socket-head cap screw, kept deliberately plain for fast renders:
// one cylinder for the shank, one for the head. tip_z is the shank tip; the
// head sits below tip_z - bolt_len.
module eco_m5_cap_screw(tip_z) color(eco_m5_black()) {
    z0 = tip_z - p_m5_bolt_len();                // underside of the head
    translate([0, 0, z0]) cylinder(d = p_m5_bolt_d(), h = p_m5_bolt_len(), $fn = 12);
    translate([0, 0, z0 - p_m5_head_h()]) cylinder(d = p_m5_head_d(), h = p_m5_head_h(), $fn = 16);
}

// Black acorn nut whose dome tip is at tip_z: hex body + hemispherical dome.
module eco_m5_acorn(tip_z) color(eco_m5_black()) {
    r = p_m5_acorn_af() / 2;
    base = tip_z - p_m5_acorn_h();
    translate([0, 0, base]) eco_m5_hex(p_m5_acorn_af(), p_m5_acorn_h() - r);
    translate([0, 0, tip_z - r]) intersection() {
        sphere(r = r, $fn = 12);
        translate([-r, -r, 0]) cube([2 * r, 2 * r, r]);
    }
}

// Open port: screw bites through the John, acorn on the tip bears on the
// bottle. Through port: screw bites through John + the fin/ballast slat that
// fills the gap, bare tip just meeting the bottle, no acorn.
module eco_m5_clamp(through = false) {
    if (through) eco_m5_cap_screw(tip_z = eco_slat_t() + eco_through_tip());
    else {
        eco_m5_cap_screw(tip_z = eco_clamp_tip());
        eco_m5_acorn(tip_z = eco_clamp_reach());
    }
}

// ---- vertical Johns + rectangle -----------------------------------
module eco_standing_little_john(target_y = 0, inside_sign = 1,
                               suppress_far_hole_presser = false,
                               suppress_near_hole_presser = false,
                               colored = true,
                               is_master = false) {
    multmatrix([[1, 0, 0, 0],
                [0, 0, 1, target_y - eco_slat_t() / 2],
                [0, 1, 0, 0],
                [0, 0, 0, 1]])
        if (is_master) eco_master_john(colored);
        else eco_little_john(colored);

    // "suppressed" ports are the ones a rear-fin / ballast slat fills: the
    // screw pair there bites through John + slat (see eco_m5_clamp()).
    inner_face_y = target_y + inside_sign * eco_slat_t() / 2;
    for (hole_x = [p_screw_side_offset(), eco_john_length() - p_screw_side_offset()]) {
        through = (suppress_far_hole_presser  && hole_x > eco_john_length() / 2)
               || (suppress_near_hole_presser && hole_x < eco_john_length() / 2);
        for (hole_z = eco_screw_ys())
            translate([hole_x, inner_face_y, hole_z])
                rotate([inside_sign > 0 ? -90 : 90, 0, 0])
                    eco_m5_clamp(through);
    }
}

module eco_standing_flipped_long_john(target_x = 0, colored = true)
    multmatrix([[0, 0, 1, target_x - eco_slat_t() / 2],
                [-1, 0, 0, eco_long_slot_2_x()],
                [0, -1, 0, eco_john_height()],
                [0, 0, 0, 1]])
        eco_long_john(colored);

// master_first_john turns this rectangle's first standing Little John (the one
// at target_y = 0) into the deeper-slotted Master John. Exactly one of the
// three rectangles in eco_ecojoiner_only() sets it.
module eco_john_rectangle(suppress_positive_port_pressers = false,
                          suppress_negative_port_pressers = false,
                          colored = true,
                          master_first_john = false) {
    eco_standing_little_john(0, +1, suppress_positive_port_pressers,
                             suppress_negative_port_pressers, colored,
                             is_master = master_first_john);
    eco_standing_little_john(eco_rectangle_y(), -1, suppress_positive_port_pressers,
                             suppress_negative_port_pressers, colored);
    eco_standing_flipped_long_john(eco_little_slot_1_x(), colored);
    eco_standing_flipped_long_john(eco_little_slot_2_x(), colored);
}

// master_first_john is last so the four positional callers in src/Full_Turtle.scad
// (rot, suppress+, suppress-, colored) are unaffected.
module eco_centered_rectangle(rot = [0, 0, 0],
                              suppress_positive_port_pressers = false,
                              suppress_negative_port_pressers = false,
                              colored = true,
                              master_first_john = false) {
    fc = eco_frame_center();
    translate(fc) rotate(rot) translate([-fc[0], -fc[1], -fc[2]])
        eco_john_rectangle(suppress_positive_port_pressers,
                           suppress_negative_port_pressers, colored,
                           master_first_john = master_first_john);
}

module eco_inserted_final_key(x_offset, z_offset, colored = true) {
    fc = eco_frame_center();
    translate([fc[0] + x_offset - eco_final_key_width() / 2,
               fc[1] - eco_final_key_length() / 2,
               fc[2] + z_offset - eco_slat_t() / 2])
        multmatrix([[0, 1, 0, 0], [1, 0, 0, 0], [0, 0, 1, 0], [0, 0, 0, 1]])
            eco_final_key(colored);
}

// ---- the standalone artifact --------------------------------------
module eco_ecojoiner_only(colored = true) {
    eco_assert_valid();
    eco_centered_rectangle([0, 0, 0], colored = colored);
    eco_centered_rectangle([0, 90, 90], colored = colored);
    // Third (last-seated) rectangle: its first standing John is the Master John.
    eco_centered_rectangle([90, 0, 90], colored = colored, master_first_john = true);
    for (x = [-eco_final_key_x_offset(), eco_final_key_x_offset()])
        for (z = [-eco_final_key_z_offset(), eco_final_key_z_offset()])
            eco_inserted_final_key(x, z, colored);

    echo("ECOJOINER: John L/H = ", eco_john_length(), eco_john_height(),
         " | slot depth std/master = ", eco_slot_depth(), eco_master_slot_depth(),
         " | slot w = ", eco_slot_width());
    echo("ECOJOINER: final key L/W/T = ", eco_final_key_length(),
         eco_final_key_width(), eco_slat_t());
    eco_echo_clamp();
}

module eco_echo_clamp() {
    echo("ECOJOINER M5 clamp: black M5x", p_m5_bolt_len(), " cap screws, 2 per John end at +-",
         p_eco_screw_pair_offset(), " | bite hole d = ", p_m5_hole_d(),
         " | port gap = ", eco_port_gap(), " | acorn reach = ", eco_clamp_reach(),
         " | head stand-off = ", eco_clamp_head_standoff(),
         " | fin/ballast ports: tip past slat = ", eco_through_tip(),
         ", head stand-off = ", eco_through_head_standoff());
}
// [bundle] end   <ecojoiner.scad>

function pr_t()         = p_wood_t();
function pr_r()         = p_bottle_d() / 2;
function pr_gap()       = eco_port_gap();                         // 12: John face -> bottle
function pr_core_w()    = pr_gap() - p_pressor_travel();          // 11: back edge -> bottle, on the centreline
function pr_width()     = pr_core_w() + p_pressor_wrap();         // 32: back edge -> inner edge
function pr_height()    = p_port_height() - p_fit_clearance()
                          - 2 * p_pressor_end_trim();             // 80.8: slides between the Long Johns
                                                                  // (v6.6.4: 83.8 printed 3 mm too long)
function pr_axis_x()    = pr_core_w() + pr_r();                   // 53: back edge -> bottle axis
function pr_arc_half()  = let(a = pr_r() - p_pressor_wrap())
                          sqrt(pr_r() * pr_r() - a * a);          // 36.4: arc ends at +-Y
function pr_screw_ys()  = [-p_eco_screw_pair_offset(), p_eco_screw_pair_offset()];
// wood along a screw line, back edge -> bottle surface (the bottle has curved away off-centre)
function pr_wood_at_screw() = let(v = p_eco_screw_pair_offset())
    pr_axis_x() - sqrt(pr_r() * pr_r() - v * v);                  // 15.05
// pill slot along the edge (v6.6.4): screw line +- p_pressor_slot_ext()
function pr_slot_inner_y() = p_eco_screw_pair_offset() - p_pressor_slot_ext() - p_pressor_hole_d() / 2; // 5.35
function pr_slot_outer_y() = p_eco_screw_pair_offset() + p_pressor_slot_ext() + p_pressor_hole_d() / 2; // 30.65
// wood behind the slot at its inner end -- the thinnest point (bottle closest)
function pr_wood_at_slot() = let(v = pr_slot_inner_y())
    pr_axis_x() - sqrt(pr_r() * pr_r() - v * v);                  // 11.34 at Ø84
// how far the cap-screw head stands off the John's outer face when pressed
function pr_head_standoff() = p_m5_bolt_len() - pr_t() - p_pressor_travel()
                              - p_pressor_hole_depth();            // 7

function pr_yellow() = [0.95, 0.55, 0.15];

module pressor_assert_valid() {
    assert(pr_core_w() > 0,
           "Pressor: travel leaves no wood on the centreline -- port gap too small.");
    assert(p_pressor_wrap() > 0 && p_pressor_wrap() < pr_r(),
           "Pressor: wrap must be between 0 and the bottle radius (the pair would meet).");
    assert(pr_arc_half() < pr_height() / 2,
           "Pressor: the arc would run out of the top/bottom edge.");
    assert(p_eco_screw_pair_offset() < pr_arc_half(),
           "Pressor: M5 pair sits outside the arc -- the screw lines miss the bottle contact.");
    assert(pr_t() - p_pressor_hole_d() >= 2 * p_pressor_min_wall(),
           "Pressor: board too thin around the M5 holes.");
    assert(pr_wood_at_slot() - p_pressor_hole_depth() >= p_pressor_min_wall(),
           "Pressor: M5 slot too deep -- its inner end would break through toward the bottle.");
    assert(pr_slot_inner_y() > 0,
           "Pressor: the two M5 slots would merge across the centreline.");
    assert(pr_slot_outer_y() <= pr_height() / 2 - p_pressor_min_wall(),
           "Pressor: M5 slot runs too close to the top/bottom edge.");
    assert(pr_head_standoff() >= 0,
           "Pressor: M5 screw too short to reach the hole depth through the John.");
    assert(pr_width() <= p_fin_board_w(),
           "Pressor: wider than the board it is cut from.");
}

// Flat profile, back edge on X = 0, centred on Y = 0.
module pressor_2d(fn = 128) {
    difference() {
        translate([0, -pr_height() / 2]) square([pr_width(), pr_height()]);
        translate([pr_axis_x(), 0]) circle(r = pr_r(), $fn = fn);
    }
}

// One pressor, board thickness on Z = 0..t, with the two M5 openings cut
// into the back edge at mid-thickness. v6.6.4: each opening is a pill slot,
// the Ø5.3 hole stretched p_pressor_slot_ext() each way along the edge (Y),
// so the John's screws locate without exact alignment.
module pressor(fn = 128, colored = true) {
    pressor_assert_valid();
    e = p_pressor_slot_ext();
    wood_color(pr_yellow(), colored)
        difference() {
            linear_extrude(height = pr_t()) pressor_2d(fn);
            for (y = pr_screw_ys())
                hull() for (dy = [-e, e])
                    translate([-0.01, y + dy, pr_t() / 2]) rotate([0, 90, 0])
                        cylinder(d = p_pressor_hole_d(), h = p_pressor_hole_depth() + 0.01, $fn = 32);
        }
}

// Inspection view of one port slice, looking down the bottle axis (Z):
// ONE pressor (the -X side) pressed onto the bottle, with a translucent
// stand-in for its Little John (port face at X = -(r + gap)). Bottle axis at
// the origin. The stand-in and the bottle are F5 references only, so F6/STL
// output is always a single piece (v6.6.3; was the mirrored pair). The
// second pressor of a port is the same part, turned to face the bottle from
// the other side. The M5 screws are not modelled (v6.6.2).
module pressor_port_assembly(fn = 128, colored = true, show_references = true) {
    face_x = pr_r() + pr_gap();                       // bottle axis -> John port face
    // pressed: back edge p_pressor_travel() off the John face
    translate([-face_x + p_pressor_travel(), 0, 0]) pressor(fn, colored);
    if (show_references)
        %translate([-face_x - pr_t(), -eco_john_height() / 2, -pr_t()])
            cube([pr_t(), eco_john_height(), 3 * pr_t()]);
    if (show_references)
        %translate([0, 0, -pr_t()]) cylinder(r = pr_r(), h = 3 * pr_t(), $fn = fn);
}

module pressor_echo() {
    echo(str("PRESSOR: ", pr_width(), " x ", pr_height(), " x ", pr_t(),
             " mm | centreline wood ", pr_core_w(), " | arc +-", pr_arc_half(),
             " | wood on screw line ", pr_wood_at_screw(),
             " | M5 slot d/depth ", p_pressor_hole_d(), "/", p_pressor_hole_depth(),
             " y ", pr_slot_inner_y(), "..", pr_slot_outer_y(),
             " | wood behind slot ", pr_wood_at_slot(),
             " | head standoff ", pr_head_standoff()));
}
// [bundle] end   <../../lib/pressor.scad>

pressor_echo();

if (part == "assembly") {
    // one pressor in its port, pressed onto the bottle (references are F5 only)
    pressor_port_assembly(fn = fn, colored = enable_color_coding,
                          show_references = show_references);
} else if (part == "pressor") {
    // one piece, lying flat on its board face -- the print / STL pose
    pressor(fn = fn, colored = enable_color_coding);
} else if (part == "profile") {
    // 2D cutting outline (export as DXF/SVG); holes are drilled into the edge
    pressor_2d(fn = fn);
} else {
    assert(false, str("Unknown part: ", part));
}
